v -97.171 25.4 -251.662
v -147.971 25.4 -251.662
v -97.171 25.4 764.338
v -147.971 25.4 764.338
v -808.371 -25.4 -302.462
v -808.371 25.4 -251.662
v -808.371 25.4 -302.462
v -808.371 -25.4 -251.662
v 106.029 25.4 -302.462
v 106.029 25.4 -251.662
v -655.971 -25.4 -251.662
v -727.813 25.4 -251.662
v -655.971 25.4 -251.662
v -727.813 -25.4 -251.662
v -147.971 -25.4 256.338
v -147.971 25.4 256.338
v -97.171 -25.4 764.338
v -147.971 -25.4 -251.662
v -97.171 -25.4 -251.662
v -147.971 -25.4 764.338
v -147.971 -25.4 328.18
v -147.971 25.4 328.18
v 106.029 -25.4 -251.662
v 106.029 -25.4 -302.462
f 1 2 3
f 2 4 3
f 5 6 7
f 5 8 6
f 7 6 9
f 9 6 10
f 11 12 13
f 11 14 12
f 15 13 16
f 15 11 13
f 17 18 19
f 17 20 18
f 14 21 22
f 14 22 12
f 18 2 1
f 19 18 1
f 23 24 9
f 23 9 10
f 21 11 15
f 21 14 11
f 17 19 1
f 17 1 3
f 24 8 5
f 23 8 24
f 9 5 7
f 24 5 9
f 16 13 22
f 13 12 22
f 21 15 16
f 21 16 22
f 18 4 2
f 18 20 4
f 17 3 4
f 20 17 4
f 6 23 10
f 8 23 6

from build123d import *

# Parameters (mm, degrees)
F1_DEPTH = 25.4
F2_DEPTH = 25.4
F3_DEPTH = 25.4


with BuildPart() as f1:
    # F0 (on Front) → F1 (new body, symmetric)
    with BuildSketch(Plane.XZ):
        Polygon((-147.9709179405, 256.338134503), (-147.9709179405, -251.661865497), (-97.1709179405, -251.661865497), (-97.1709179405, 764.338134503), (-147.9709179405, 764.338134503), (-147.9709179405, 328.1801834716), align=None)
    extrude(amount=F1_DEPTH, both=True)


with BuildPart() as f2:
    # F0 (on Front) → F2 (new body, symmetric)
    with BuildSketch(Plane.XZ):
        Polygon((-97.1709179405, -251.661865497), (-147.9709179405, -251.661865497), (-655.9709179405, -251.661865497), (-727.8129669091, -251.661865497), (-808.3709179405, -251.661865497), (-808.3709179405, -302.461865497), (106.0290820595, -302.461865497), (106.0290820595, -251.661865497), align=None)
    extrude(amount=F2_DEPTH, both=True)


with BuildPart() as f3:
    # F0 (on Front) → F3 (new body, symmetric)
    with BuildSketch(Plane.XZ):
        Polygon((-655.9709179405, -251.661865497), (-147.9709179405, 256.338134503), (-147.9709179405, 328.1801834716), (-727.8129669091, -251.661865497), align=None)
    extrude(amount=F3_DEPTH, both=True)


solid = Compound([f1.part, f2.part, f3.part])
